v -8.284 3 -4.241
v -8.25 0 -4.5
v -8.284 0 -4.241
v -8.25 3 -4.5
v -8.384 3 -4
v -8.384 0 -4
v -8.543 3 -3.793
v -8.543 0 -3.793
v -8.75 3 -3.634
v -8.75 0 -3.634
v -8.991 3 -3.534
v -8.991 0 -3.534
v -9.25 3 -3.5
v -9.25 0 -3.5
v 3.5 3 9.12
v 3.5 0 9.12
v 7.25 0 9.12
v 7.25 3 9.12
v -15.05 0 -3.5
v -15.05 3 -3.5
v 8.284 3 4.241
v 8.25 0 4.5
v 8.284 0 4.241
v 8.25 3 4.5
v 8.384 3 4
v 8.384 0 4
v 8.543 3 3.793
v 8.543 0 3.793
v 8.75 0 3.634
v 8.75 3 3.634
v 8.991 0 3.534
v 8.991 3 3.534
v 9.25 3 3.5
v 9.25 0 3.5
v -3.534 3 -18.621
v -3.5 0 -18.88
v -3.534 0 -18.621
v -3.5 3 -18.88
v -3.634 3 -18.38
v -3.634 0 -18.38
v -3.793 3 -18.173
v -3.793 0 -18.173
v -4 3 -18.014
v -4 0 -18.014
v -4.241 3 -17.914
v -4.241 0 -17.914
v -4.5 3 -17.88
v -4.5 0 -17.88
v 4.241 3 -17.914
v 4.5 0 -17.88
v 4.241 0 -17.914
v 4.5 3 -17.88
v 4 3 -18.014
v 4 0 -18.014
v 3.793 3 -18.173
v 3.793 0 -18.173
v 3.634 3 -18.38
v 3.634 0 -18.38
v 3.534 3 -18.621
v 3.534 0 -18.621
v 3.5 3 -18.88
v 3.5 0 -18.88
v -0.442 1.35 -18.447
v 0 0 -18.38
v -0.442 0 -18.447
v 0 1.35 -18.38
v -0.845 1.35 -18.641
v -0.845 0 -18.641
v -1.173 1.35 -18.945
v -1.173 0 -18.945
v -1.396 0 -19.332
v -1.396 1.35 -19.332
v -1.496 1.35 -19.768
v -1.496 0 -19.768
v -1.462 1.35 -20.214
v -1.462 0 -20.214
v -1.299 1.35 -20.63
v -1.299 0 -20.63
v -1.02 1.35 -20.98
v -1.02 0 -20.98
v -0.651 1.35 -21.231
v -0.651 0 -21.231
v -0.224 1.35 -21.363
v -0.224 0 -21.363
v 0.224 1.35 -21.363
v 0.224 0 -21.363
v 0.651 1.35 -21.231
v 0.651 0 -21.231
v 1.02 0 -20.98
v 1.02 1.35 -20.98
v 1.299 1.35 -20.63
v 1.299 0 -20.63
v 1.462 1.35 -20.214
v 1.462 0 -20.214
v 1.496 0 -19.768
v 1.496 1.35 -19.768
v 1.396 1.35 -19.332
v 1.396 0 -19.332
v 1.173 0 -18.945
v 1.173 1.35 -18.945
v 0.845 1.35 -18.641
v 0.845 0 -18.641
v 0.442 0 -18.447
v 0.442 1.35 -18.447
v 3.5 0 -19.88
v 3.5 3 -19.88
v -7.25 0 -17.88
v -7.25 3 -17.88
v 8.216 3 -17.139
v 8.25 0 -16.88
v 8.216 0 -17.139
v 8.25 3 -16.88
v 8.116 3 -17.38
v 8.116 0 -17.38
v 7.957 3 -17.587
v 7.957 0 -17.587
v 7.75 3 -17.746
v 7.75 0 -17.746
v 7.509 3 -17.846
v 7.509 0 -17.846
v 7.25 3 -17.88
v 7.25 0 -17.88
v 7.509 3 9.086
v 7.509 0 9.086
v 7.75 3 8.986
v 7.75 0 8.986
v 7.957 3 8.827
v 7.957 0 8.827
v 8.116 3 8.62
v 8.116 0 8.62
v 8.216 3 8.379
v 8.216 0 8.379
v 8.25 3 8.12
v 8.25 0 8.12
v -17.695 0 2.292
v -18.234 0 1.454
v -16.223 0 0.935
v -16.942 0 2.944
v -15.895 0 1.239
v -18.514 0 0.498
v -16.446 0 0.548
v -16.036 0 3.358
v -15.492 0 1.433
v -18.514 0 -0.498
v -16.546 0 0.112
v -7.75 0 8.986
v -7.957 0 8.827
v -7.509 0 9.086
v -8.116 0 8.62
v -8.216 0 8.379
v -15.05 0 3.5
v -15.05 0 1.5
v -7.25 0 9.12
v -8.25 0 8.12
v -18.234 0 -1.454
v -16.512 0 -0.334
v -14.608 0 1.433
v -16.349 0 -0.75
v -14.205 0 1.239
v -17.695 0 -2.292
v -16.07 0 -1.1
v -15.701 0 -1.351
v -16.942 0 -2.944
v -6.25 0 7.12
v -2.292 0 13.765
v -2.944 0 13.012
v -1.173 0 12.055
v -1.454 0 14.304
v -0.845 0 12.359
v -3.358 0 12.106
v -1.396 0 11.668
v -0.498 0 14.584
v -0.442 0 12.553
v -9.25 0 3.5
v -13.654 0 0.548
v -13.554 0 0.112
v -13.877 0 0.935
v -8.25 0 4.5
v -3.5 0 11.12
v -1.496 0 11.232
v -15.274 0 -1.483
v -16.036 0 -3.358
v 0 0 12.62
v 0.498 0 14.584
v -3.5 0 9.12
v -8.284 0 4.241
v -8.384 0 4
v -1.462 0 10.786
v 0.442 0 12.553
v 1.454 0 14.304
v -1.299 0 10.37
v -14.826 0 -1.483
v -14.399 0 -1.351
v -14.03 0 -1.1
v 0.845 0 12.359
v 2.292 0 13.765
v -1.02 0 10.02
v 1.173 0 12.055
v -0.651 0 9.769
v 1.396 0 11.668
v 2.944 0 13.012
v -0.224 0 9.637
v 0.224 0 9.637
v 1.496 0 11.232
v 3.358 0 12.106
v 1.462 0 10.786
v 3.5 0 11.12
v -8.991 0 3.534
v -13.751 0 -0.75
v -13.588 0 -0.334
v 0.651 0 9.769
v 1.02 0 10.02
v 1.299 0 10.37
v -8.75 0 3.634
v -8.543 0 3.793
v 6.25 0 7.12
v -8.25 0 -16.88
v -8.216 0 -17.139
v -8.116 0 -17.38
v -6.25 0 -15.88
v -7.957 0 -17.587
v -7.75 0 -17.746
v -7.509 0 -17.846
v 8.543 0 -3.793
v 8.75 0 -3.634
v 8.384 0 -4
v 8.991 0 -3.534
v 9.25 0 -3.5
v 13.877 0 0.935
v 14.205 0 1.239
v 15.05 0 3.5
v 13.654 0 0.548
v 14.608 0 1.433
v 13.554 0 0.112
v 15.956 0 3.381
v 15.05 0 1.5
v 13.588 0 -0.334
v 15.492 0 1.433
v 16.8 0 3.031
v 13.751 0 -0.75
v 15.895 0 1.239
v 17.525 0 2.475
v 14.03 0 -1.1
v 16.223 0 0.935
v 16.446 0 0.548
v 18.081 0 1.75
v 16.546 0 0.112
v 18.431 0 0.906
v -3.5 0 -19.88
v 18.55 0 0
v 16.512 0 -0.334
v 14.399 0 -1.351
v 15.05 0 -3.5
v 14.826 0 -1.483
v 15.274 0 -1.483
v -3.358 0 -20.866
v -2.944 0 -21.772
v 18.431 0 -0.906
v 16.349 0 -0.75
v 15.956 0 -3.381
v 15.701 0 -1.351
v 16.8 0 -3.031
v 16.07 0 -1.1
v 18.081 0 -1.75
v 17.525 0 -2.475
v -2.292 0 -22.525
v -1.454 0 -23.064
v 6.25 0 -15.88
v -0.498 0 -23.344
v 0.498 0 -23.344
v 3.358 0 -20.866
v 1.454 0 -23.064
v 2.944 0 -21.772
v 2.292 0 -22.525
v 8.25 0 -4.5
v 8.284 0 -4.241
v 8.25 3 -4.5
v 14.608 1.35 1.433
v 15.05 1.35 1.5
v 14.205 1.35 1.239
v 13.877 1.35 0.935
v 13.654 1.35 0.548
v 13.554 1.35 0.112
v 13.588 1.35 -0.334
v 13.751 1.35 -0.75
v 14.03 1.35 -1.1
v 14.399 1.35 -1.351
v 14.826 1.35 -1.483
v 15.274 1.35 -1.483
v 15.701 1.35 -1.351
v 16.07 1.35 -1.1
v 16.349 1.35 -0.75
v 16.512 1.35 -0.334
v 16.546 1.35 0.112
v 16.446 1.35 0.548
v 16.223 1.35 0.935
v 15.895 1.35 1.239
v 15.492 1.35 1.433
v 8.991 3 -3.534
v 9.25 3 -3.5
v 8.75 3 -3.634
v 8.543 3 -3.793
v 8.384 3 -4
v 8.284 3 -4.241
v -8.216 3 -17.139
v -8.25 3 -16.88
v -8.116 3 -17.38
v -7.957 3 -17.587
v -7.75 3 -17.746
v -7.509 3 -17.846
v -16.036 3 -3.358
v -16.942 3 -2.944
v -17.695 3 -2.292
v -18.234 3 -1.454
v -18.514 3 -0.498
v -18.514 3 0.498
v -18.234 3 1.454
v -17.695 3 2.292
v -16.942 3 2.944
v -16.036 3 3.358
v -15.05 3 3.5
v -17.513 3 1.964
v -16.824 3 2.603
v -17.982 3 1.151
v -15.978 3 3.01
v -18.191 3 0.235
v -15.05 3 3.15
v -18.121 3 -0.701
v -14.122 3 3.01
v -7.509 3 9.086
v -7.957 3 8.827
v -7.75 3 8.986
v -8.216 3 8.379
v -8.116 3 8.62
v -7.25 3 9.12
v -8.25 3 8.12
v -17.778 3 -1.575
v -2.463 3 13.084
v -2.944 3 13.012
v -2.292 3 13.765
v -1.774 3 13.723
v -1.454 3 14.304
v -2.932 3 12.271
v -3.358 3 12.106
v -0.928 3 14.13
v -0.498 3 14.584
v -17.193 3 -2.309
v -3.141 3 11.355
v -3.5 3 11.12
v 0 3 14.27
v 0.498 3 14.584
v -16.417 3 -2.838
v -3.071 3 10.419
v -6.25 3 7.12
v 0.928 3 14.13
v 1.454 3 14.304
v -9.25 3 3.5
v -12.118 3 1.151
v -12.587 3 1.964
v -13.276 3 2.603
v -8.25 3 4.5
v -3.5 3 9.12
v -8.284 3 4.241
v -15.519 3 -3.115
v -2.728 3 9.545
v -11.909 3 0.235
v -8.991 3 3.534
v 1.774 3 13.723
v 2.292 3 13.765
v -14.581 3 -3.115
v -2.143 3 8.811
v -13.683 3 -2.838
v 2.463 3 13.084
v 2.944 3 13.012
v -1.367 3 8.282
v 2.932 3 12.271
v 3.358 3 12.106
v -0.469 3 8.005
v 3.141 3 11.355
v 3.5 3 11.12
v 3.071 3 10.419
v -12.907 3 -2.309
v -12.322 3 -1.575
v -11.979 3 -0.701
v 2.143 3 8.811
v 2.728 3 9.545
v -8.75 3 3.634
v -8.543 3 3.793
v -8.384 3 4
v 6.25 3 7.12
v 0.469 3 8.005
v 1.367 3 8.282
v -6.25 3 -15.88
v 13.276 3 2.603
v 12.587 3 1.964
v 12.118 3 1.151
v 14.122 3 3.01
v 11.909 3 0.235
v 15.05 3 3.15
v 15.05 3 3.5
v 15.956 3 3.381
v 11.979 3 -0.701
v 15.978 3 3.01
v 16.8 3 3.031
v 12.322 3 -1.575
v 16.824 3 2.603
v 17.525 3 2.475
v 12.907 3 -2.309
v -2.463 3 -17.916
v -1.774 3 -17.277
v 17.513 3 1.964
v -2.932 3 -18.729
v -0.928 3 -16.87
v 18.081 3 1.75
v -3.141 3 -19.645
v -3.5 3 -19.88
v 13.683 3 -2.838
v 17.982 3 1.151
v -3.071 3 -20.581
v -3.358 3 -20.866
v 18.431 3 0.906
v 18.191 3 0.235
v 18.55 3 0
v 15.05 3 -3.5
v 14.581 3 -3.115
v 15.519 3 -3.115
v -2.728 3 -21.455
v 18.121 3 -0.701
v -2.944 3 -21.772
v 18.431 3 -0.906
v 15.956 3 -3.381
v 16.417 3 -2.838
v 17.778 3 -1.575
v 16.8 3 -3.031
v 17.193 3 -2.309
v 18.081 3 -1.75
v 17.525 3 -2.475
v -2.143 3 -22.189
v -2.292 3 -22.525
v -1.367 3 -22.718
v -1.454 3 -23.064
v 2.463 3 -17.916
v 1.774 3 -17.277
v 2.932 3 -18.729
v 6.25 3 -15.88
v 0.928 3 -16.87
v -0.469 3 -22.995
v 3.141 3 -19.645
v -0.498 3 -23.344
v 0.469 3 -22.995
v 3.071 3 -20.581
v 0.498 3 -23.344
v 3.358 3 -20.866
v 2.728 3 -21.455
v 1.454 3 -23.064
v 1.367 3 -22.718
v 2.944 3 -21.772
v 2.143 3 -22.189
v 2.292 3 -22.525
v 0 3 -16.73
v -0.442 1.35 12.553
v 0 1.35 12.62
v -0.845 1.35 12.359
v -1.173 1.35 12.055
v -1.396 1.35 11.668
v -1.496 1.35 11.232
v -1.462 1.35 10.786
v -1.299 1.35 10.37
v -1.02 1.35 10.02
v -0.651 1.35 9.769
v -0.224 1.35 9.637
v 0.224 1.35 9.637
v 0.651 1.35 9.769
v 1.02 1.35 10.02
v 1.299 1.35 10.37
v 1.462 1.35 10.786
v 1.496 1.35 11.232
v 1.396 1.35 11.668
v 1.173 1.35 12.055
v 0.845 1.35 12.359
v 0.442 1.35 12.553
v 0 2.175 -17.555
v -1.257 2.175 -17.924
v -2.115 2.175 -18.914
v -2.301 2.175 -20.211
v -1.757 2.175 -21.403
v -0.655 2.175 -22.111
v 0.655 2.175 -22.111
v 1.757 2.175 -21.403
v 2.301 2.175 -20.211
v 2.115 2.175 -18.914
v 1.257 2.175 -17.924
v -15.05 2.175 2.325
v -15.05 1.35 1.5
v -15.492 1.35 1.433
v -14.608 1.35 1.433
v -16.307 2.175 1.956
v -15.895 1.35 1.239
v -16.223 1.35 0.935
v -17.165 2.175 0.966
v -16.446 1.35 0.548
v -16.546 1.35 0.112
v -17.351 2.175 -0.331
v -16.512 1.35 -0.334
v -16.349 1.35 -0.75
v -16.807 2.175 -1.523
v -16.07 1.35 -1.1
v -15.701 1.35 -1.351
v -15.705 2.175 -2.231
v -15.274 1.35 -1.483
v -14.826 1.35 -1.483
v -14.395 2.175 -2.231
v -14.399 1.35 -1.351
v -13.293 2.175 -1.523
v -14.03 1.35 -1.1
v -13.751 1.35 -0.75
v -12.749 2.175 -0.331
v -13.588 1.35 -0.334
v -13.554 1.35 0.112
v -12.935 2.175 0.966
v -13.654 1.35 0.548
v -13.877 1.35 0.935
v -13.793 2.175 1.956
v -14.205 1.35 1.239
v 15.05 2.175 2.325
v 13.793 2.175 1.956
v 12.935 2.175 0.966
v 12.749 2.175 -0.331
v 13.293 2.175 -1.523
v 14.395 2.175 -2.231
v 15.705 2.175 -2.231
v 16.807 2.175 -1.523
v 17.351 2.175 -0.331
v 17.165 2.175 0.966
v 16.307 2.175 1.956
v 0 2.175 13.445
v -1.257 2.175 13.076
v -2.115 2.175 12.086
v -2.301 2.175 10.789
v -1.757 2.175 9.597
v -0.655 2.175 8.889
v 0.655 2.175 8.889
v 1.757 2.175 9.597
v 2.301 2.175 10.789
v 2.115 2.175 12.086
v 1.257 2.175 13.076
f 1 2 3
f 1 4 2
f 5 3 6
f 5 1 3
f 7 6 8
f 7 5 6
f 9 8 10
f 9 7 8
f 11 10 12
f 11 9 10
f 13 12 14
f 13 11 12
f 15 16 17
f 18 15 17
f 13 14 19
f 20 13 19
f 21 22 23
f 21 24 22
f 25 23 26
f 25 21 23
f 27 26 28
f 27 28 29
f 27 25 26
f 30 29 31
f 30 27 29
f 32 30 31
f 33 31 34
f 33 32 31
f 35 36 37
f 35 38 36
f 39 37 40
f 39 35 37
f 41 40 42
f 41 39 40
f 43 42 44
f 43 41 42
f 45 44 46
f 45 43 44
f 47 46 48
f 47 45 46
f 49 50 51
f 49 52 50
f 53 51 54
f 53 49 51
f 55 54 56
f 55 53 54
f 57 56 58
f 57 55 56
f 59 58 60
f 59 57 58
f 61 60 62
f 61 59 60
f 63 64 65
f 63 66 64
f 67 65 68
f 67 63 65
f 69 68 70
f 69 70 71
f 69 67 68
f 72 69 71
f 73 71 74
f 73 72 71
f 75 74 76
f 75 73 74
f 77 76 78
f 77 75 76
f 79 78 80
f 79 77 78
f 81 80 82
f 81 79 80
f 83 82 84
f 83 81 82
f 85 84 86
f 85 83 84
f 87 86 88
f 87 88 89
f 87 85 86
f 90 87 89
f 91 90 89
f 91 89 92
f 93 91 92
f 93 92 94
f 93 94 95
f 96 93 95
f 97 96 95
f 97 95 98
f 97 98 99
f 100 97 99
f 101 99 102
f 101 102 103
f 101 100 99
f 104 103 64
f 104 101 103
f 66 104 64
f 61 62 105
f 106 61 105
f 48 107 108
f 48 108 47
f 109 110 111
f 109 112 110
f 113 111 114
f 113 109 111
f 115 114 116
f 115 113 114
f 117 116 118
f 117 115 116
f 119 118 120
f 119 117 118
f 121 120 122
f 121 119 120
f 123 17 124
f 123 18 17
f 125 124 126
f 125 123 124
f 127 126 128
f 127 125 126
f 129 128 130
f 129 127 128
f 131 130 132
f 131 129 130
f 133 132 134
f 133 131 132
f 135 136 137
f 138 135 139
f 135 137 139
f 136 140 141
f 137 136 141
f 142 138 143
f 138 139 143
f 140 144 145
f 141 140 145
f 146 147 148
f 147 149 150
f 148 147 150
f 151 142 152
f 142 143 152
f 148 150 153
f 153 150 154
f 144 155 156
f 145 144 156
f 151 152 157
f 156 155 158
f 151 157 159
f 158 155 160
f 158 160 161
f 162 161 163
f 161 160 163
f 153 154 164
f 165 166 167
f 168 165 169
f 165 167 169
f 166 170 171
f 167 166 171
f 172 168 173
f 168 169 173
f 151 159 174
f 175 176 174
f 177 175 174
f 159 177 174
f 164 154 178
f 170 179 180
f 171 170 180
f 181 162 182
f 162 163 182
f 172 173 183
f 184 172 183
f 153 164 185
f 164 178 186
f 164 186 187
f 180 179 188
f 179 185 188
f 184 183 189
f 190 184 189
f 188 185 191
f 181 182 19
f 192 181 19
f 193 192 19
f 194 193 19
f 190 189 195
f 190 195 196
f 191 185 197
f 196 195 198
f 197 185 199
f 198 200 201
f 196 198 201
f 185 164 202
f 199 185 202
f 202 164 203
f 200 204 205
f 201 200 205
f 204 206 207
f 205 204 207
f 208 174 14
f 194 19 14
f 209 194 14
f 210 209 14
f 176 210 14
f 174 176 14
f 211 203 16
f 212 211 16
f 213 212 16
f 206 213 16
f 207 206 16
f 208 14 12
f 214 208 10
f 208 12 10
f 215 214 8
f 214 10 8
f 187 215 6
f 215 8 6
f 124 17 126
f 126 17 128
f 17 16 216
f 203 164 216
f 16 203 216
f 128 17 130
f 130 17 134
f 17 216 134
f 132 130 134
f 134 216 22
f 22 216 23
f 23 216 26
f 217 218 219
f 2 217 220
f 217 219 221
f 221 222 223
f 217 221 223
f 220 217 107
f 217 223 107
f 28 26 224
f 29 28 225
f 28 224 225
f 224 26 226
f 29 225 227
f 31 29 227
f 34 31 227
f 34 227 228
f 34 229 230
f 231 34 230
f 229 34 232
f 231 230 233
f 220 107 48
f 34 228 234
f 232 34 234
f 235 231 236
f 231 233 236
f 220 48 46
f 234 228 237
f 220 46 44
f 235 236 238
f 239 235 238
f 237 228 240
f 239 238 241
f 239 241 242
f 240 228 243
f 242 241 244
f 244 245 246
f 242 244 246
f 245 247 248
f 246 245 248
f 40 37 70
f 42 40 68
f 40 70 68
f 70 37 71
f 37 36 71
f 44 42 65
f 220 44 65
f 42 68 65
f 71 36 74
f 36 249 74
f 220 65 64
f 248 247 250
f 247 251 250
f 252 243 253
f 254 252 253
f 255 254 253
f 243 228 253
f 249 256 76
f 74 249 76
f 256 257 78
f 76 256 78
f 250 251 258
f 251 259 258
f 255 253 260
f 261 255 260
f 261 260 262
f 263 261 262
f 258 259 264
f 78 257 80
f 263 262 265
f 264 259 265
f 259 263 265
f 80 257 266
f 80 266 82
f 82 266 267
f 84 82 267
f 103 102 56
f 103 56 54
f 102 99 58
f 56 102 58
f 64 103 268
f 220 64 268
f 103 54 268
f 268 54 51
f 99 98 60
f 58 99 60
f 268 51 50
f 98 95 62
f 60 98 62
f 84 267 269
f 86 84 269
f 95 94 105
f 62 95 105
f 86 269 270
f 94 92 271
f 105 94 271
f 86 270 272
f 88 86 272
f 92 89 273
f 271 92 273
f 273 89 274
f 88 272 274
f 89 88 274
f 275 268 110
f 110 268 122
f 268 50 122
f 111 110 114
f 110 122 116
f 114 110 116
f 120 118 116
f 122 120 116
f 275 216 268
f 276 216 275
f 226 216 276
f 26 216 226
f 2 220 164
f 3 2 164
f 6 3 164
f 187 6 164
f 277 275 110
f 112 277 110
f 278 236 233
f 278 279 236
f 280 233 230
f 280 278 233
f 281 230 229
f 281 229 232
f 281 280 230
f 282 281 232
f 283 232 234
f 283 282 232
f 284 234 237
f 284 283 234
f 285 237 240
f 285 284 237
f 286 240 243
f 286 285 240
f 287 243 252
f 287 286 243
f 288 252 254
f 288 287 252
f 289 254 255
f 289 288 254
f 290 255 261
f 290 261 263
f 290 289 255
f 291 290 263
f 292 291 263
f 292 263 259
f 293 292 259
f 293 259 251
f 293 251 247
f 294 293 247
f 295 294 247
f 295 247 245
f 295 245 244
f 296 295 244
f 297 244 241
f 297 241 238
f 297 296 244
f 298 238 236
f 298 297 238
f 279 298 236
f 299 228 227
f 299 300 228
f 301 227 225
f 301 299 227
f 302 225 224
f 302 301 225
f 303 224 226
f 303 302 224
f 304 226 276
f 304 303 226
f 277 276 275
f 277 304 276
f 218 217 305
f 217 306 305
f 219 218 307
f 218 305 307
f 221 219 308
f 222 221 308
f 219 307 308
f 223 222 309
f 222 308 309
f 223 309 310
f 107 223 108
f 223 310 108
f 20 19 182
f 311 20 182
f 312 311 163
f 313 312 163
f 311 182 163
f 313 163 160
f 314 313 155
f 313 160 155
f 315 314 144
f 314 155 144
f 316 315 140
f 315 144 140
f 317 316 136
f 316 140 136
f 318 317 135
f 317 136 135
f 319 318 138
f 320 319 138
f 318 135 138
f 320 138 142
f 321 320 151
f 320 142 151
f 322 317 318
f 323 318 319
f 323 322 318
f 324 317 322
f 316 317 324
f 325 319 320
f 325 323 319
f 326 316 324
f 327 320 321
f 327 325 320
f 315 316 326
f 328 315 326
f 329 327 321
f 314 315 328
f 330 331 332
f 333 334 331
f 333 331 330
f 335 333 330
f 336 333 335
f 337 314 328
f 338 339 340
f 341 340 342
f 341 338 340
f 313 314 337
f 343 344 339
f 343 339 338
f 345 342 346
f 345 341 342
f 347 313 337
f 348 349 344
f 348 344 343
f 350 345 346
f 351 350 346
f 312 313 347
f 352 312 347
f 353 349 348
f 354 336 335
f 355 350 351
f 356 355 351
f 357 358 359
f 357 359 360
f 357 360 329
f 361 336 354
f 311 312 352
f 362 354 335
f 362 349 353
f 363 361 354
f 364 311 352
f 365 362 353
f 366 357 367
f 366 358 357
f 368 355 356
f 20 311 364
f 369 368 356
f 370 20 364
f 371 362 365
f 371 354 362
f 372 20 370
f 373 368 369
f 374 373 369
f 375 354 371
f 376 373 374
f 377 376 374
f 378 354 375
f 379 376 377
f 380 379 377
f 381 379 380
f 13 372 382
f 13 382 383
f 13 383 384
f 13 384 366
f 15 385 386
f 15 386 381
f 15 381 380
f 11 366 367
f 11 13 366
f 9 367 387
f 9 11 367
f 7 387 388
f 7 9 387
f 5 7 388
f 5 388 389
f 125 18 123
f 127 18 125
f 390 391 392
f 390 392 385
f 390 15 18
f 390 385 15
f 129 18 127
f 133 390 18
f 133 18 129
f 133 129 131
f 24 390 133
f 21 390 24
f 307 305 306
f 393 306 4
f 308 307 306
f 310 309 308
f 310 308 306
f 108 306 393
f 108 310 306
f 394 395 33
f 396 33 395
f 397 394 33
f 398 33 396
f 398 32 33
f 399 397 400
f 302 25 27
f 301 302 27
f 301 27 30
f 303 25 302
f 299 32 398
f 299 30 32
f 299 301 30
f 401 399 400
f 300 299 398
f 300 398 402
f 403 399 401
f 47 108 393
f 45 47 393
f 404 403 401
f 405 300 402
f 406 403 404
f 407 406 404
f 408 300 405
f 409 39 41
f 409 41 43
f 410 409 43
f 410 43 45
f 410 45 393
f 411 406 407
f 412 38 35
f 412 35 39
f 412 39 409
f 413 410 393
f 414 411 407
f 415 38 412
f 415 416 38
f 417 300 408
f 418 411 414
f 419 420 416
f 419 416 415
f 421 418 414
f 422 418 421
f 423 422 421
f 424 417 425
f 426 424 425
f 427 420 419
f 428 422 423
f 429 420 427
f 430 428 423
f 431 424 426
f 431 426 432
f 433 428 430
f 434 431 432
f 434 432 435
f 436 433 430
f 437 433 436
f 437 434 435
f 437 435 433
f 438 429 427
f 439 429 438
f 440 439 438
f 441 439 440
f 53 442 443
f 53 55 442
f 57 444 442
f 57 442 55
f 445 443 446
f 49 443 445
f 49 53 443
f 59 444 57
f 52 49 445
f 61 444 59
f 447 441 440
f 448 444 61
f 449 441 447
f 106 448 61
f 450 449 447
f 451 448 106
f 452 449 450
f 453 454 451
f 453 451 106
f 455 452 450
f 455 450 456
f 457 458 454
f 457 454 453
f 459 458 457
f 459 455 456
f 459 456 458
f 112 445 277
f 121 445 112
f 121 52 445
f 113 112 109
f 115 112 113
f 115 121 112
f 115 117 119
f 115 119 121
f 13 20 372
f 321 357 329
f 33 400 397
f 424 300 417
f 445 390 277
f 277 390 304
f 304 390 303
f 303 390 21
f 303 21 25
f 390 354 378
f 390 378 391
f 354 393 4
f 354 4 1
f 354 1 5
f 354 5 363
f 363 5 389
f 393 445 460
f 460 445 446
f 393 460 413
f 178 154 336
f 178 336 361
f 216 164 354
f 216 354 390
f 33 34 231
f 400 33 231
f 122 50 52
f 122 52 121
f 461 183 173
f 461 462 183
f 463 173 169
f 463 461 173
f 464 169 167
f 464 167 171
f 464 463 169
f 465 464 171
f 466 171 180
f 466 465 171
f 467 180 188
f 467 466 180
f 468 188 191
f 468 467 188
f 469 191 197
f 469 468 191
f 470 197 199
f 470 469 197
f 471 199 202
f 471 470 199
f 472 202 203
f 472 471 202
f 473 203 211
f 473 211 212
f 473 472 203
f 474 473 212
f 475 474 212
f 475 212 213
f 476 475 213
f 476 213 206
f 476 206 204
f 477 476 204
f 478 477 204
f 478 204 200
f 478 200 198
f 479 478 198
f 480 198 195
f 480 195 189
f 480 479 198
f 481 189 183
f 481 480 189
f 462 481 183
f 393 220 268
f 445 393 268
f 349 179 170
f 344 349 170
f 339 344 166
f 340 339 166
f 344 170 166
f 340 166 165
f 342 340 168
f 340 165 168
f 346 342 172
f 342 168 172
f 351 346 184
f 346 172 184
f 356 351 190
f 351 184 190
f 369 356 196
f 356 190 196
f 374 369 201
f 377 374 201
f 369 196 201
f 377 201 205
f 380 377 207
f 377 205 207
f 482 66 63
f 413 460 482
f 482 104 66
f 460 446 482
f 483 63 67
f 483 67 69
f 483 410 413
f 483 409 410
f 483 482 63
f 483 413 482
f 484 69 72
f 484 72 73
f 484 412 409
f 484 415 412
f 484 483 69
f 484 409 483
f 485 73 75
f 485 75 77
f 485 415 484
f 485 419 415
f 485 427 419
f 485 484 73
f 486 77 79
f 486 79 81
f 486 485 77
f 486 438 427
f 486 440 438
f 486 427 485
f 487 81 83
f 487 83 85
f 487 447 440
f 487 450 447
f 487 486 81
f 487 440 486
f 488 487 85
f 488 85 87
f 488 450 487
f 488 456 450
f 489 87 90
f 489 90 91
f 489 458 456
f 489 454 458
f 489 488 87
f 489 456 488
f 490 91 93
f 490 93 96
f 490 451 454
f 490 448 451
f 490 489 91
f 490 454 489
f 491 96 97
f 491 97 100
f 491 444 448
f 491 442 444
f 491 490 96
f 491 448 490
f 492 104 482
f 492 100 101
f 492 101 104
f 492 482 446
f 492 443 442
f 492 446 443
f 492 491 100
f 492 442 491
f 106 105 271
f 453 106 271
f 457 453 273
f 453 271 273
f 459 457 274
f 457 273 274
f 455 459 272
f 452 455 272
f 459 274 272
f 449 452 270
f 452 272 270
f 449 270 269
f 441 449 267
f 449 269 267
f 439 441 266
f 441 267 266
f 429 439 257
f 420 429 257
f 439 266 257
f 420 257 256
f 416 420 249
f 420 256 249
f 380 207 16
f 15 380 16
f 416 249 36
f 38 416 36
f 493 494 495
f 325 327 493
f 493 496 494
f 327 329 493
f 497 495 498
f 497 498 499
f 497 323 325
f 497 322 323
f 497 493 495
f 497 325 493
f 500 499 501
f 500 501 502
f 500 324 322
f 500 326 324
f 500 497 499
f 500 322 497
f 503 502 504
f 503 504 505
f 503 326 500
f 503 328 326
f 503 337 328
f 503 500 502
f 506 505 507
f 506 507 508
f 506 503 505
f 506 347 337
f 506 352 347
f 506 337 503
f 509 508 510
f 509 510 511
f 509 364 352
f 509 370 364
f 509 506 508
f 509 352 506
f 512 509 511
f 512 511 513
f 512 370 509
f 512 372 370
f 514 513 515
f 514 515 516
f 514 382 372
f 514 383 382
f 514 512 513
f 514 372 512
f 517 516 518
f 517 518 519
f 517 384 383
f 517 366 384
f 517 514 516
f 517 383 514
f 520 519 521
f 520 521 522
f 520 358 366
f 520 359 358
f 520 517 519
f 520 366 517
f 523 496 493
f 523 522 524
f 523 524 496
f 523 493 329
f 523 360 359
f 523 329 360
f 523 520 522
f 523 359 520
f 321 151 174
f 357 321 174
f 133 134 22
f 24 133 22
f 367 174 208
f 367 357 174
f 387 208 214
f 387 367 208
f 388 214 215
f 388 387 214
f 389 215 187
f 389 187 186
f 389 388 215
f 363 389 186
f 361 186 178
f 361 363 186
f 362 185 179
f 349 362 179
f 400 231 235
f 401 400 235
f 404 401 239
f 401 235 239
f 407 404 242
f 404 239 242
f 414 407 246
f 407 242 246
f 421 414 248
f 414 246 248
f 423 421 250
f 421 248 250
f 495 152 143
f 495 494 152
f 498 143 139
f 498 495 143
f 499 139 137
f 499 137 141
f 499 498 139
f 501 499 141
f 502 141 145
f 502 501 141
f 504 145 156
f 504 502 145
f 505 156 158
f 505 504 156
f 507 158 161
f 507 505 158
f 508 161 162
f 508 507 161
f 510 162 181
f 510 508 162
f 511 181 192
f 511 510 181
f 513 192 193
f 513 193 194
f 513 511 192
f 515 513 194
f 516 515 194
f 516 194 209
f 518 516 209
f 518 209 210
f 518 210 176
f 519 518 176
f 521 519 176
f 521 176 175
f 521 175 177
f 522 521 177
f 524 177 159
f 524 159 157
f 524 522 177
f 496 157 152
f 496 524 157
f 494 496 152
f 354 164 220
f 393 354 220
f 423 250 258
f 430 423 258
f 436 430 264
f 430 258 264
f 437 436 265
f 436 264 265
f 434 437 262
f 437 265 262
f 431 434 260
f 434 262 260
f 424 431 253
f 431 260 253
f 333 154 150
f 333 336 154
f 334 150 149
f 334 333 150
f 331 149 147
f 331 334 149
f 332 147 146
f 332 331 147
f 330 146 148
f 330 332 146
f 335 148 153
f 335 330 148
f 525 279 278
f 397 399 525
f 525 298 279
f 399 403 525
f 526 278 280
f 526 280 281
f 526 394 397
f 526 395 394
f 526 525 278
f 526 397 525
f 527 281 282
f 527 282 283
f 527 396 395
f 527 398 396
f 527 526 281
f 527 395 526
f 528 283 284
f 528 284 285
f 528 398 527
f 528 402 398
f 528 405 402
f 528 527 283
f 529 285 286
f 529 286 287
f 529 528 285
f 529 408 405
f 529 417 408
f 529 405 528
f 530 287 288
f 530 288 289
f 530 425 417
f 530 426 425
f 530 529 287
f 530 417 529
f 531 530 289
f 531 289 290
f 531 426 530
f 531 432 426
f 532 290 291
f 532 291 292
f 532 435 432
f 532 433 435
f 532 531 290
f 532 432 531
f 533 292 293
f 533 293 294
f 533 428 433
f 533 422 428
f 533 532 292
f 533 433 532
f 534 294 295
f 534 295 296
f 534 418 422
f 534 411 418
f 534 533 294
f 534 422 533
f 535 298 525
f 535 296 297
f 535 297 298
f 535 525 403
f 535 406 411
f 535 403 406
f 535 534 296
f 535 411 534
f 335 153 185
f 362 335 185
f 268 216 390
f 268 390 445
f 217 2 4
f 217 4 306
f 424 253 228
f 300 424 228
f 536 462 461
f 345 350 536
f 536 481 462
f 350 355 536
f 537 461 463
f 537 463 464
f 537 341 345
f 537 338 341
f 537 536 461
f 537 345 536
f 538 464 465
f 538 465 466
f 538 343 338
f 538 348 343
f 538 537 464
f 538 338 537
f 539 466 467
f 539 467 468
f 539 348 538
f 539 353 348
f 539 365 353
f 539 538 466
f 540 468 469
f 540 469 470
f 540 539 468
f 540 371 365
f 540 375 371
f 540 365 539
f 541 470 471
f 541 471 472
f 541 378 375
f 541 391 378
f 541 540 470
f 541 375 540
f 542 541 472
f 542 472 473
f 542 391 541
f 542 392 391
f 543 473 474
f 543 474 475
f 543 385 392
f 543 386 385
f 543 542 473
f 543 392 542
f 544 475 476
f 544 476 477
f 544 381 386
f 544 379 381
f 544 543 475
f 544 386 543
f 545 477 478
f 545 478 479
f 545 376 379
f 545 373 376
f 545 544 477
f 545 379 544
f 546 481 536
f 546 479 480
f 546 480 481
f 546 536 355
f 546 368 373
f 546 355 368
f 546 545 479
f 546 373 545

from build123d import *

# Parameters (mm, degrees)
SKETCH1_R                                      = 3.5
SKETCH1_W                                      = 16.5
SKETCH1_H                                      = 27
SKETCH1_W_2                                    = 12.5
SKETCH1_H_2                                    = 23
BOSS_EXTRUDE1_DEPTH                            = 3
FILLET1_R                                      = 1
CSK_FOR_M3_FLAT_HEAD_MACHINE_SCREW2_AT_2_COUNT = 2
CSK_FOR_M3_FLAT_HEAD_MACHINE_SCREW2_AT_2_PITCH = 30.1
CSK_FOR_M3_FLAT_HEAD_MACHINE_SCREW2_AT_3_COUNT = 2
CSK_FOR_M3_FLAT_HEAD_MACHINE_SCREW2_AT_3_PITCH = 18.712479793
CSK_FOR_M3_FLAT_HEAD_MACHINE_SCREW2_AT_4_COUNT = 2
CSK_FOR_M3_FLAT_HEAD_MACHINE_SCREW2_AT_4_PITCH = 24.934251543


with BuildPart() as part:
    # Sketch1 → Boss-Extrude1 (new body)
    with BuildSketch(Plane(origin=(0, 0, 0), x_dir=(1, 0, 0), z_dir=(0, 1, 0))):
        with BuildLine():
            ThreePointArc((-11.55, 0), (-12.575126266, 2.474873734), (-15.05, 3.5))
            ThreePointArc((-15.05, 3.5), (-18.55, 0), (-15.05, -3.5))
            ThreePointArc((-15.05, -3.5), (-12.575126266, -2.474873734), (-11.55, 0))
        make_face()
        with BuildLine():
            Line((-8.25, -3.5), (-8.25, 3.5))
            Line((-8.25, 3.5), (-15.05, 3.5))
            ThreePointArc((-15.05, 3.5), (-12.575126266, 2.474873734), (-11.55, 0))
            ThreePointArc((-11.55, 0), (-12.575126266, -2.474873734), (-15.05, -3.5))
            Line((-15.05, -3.5), (-8.25, -3.5))
        make_face()
        with Locations((0, -11.12)):
            Circle(SKETCH1_R)
        with Locations((0, 19.88)):
            Circle(SKETCH1_R)
        with Locations((0, 4.38)):
            Rectangle(SKETCH1_W, SKETCH1_H)
        with Locations((0, 4.38)):
            Rectangle(SKETCH1_W_2, SKETCH1_H_2, mode=Mode.SUBTRACT)
        with BuildLine():
            Line((-2.872281323, -9.12), (-3.5, -9.12))
            Line((-3.5, -9.12), (-3.5, -11.12))
            ThreePointArc((-3.5, -11.12), (-3.339385021, -10.071902827), (-2.872281323, -9.12))
        make_face()
        with BuildLine():
            ThreePointArc((2.872281323, -9.12), (0, -7.62), (-2.872281323, -9.12))
            Line((-2.872281323, -9.12), (2.872281323, -9.12))
        make_face()
        with BuildLine():
            Line((2.872281323, -9.12), (-2.872281323, -9.12))
            ThreePointArc((-2.872281323, -9.12), (-3.339385021, -10.071902827), (-3.5, -11.12))
            ThreePointArc((-3.5, -11.12), (0, -14.62), (3.5, -11.12))
            ThreePointArc((3.5, -11.12), (3.339385021, -10.071902827), (2.872281323, -9.12))
        make_face()
        with BuildLine():
            Line((3.5, -9.12), (2.872281323, -9.12))
            ThreePointArc((2.872281323, -9.12), (3.339385021, -10.071902827), (3.5, -11.12))
            Line((3.5, -11.12), (3.5, -9.12))
        make_face()
        with BuildLine():
            ThreePointArc((3.5, 19.88), (3.339385021, 18.831902827), (2.872281323, 17.88))
            Line((2.872281323, 17.88), (3.5, 17.88))
            Line((3.5, 17.88), (3.5, 19.88))
        make_face()
        with BuildLine():
            Line((2.872281323, 17.88), (-2.872281323, 17.88))
            ThreePointArc((-2.872281323, 17.88), (0, 16.38), (2.872281323, 17.88))
        make_face()
        with BuildLine():
            Line((-3.5, 19.88), (-3.5, 17.88))
            Line((-3.5, 17.88), (-2.872281323, 17.88))
            ThreePointArc((-2.872281323, 17.88), (-3.339385021, 18.831902827), (-3.5, 19.88))
        make_face()
        with BuildLine():
            ThreePointArc((-3.5, 19.88), (-3.339385021, 18.831902827), (-2.872281323, 17.88))
            Line((-2.872281323, 17.88), (2.872281323, 17.88))
            ThreePointArc((2.872281323, 17.88), (3.339385021, 18.831902827), (3.5, 19.88))
            ThreePointArc((3.5, 19.88), (0, 23.38), (-3.5, 19.88))
        make_face()
        with BuildLine():
            Line((15.05, 3.5), (8.25, 3.5))
            Line((8.25, 3.5), (8.25, -3.5))
            Line((8.25, -3.5), (15.05, -3.5))
            ThreePointArc((15.05, -3.5), (11.55, 0), (15.05, 3.5))
        make_face()
        with BuildLine():
            ThreePointArc((18.55, 0), (17.524873734, 2.474873734), (15.05, 3.5))
            ThreePointArc((15.05, 3.5), (11.55, 0), (15.05, -3.5))
            ThreePointArc((15.05, -3.5), (17.524873734, -2.474873734), (18.55, 0))
        make_face()
    extrude(amount=BOSS_EXTRUDE1_DEPTH)

    # Fillet1
    fillet1_edges = [part.edges().sort_by_distance(p)[0] for p in [
        (3.5, 1.5, -17.88),
        (8.25, 1.5, -17.88),
        (8.25, 1.5, -3.5),
        (8.25, 1.5, 3.5),
        (8.25, 1.5, 9.12),
        (-8.25, 1.5, 9.12),
        (-8.25, 1.5, 3.5),
        (-8.25, 1.5, -3.5),
        (-8.25, 1.5, -17.88),
        (-3.5, 1.5, -17.88),
    ]]
    fillet(fillet1_edges, radius=FILLET1_R)

    # Sketch2 → CSK for M3 Flat Head Machine Screw2 (revolve, cut)
    with BuildSketch(Plane(origin=(15.05, 3, 0), x_dir=(0, 0, 1), z_dir=(1, 0, 0))):
        Polygon((0, 0), (0, 3), (1.5, 3), (1.5, 1.65), (3.15, 0), align=None)
    csk_for_m3_flat_head_machine_screw2 = revolve(axis=Axis((15.05, 9.35, 0), (0, -1, 0)), mode=Mode.SUBTRACT)

    # CSK for M3 Flat Head Machine Screw2 at 2: CSK for M3 Flat Head Machine Screw2 ×2
    with Locations(*[(-i * CSK_FOR_M3_FLAT_HEAD_MACHINE_SCREW2_AT_2_PITCH, 0, 0) for i in range(1, CSK_FOR_M3_FLAT_HEAD_MACHINE_SCREW2_AT_2_COUNT)]):
        add(csk_for_m3_flat_head_machine_screw2, mode=Mode.SUBTRACT)

    # CSK for M3 Flat Head Machine Screw2 at 3: CSK for M3 Flat Head Machine Screw2 ×2
    with Locations(*[Vector(-0.804276086, 0, 0.594255819) * (i * CSK_FOR_M3_FLAT_HEAD_MACHINE_SCREW2_AT_3_PITCH) for i in range(1, CSK_FOR_M3_FLAT_HEAD_MACHINE_SCREW2_AT_3_COUNT)]):
        add(csk_for_m3_flat_head_machine_screw2, mode=Mode.SUBTRACT)

    # CSK for M3 Flat Head Machine Screw2 at 4: CSK for M3 Flat Head Machine Screw2 ×2
    with Locations(*[Vector(-0.603587398, 0, -0.797296841) * (i * CSK_FOR_M3_FLAT_HEAD_MACHINE_SCREW2_AT_4_PITCH) for i in range(1, CSK_FOR_M3_FLAT_HEAD_MACHINE_SCREW2_AT_4_COUNT)]):
        add(csk_for_m3_flat_head_machine_screw2, mode=Mode.SUBTRACT)


solid = part.part
